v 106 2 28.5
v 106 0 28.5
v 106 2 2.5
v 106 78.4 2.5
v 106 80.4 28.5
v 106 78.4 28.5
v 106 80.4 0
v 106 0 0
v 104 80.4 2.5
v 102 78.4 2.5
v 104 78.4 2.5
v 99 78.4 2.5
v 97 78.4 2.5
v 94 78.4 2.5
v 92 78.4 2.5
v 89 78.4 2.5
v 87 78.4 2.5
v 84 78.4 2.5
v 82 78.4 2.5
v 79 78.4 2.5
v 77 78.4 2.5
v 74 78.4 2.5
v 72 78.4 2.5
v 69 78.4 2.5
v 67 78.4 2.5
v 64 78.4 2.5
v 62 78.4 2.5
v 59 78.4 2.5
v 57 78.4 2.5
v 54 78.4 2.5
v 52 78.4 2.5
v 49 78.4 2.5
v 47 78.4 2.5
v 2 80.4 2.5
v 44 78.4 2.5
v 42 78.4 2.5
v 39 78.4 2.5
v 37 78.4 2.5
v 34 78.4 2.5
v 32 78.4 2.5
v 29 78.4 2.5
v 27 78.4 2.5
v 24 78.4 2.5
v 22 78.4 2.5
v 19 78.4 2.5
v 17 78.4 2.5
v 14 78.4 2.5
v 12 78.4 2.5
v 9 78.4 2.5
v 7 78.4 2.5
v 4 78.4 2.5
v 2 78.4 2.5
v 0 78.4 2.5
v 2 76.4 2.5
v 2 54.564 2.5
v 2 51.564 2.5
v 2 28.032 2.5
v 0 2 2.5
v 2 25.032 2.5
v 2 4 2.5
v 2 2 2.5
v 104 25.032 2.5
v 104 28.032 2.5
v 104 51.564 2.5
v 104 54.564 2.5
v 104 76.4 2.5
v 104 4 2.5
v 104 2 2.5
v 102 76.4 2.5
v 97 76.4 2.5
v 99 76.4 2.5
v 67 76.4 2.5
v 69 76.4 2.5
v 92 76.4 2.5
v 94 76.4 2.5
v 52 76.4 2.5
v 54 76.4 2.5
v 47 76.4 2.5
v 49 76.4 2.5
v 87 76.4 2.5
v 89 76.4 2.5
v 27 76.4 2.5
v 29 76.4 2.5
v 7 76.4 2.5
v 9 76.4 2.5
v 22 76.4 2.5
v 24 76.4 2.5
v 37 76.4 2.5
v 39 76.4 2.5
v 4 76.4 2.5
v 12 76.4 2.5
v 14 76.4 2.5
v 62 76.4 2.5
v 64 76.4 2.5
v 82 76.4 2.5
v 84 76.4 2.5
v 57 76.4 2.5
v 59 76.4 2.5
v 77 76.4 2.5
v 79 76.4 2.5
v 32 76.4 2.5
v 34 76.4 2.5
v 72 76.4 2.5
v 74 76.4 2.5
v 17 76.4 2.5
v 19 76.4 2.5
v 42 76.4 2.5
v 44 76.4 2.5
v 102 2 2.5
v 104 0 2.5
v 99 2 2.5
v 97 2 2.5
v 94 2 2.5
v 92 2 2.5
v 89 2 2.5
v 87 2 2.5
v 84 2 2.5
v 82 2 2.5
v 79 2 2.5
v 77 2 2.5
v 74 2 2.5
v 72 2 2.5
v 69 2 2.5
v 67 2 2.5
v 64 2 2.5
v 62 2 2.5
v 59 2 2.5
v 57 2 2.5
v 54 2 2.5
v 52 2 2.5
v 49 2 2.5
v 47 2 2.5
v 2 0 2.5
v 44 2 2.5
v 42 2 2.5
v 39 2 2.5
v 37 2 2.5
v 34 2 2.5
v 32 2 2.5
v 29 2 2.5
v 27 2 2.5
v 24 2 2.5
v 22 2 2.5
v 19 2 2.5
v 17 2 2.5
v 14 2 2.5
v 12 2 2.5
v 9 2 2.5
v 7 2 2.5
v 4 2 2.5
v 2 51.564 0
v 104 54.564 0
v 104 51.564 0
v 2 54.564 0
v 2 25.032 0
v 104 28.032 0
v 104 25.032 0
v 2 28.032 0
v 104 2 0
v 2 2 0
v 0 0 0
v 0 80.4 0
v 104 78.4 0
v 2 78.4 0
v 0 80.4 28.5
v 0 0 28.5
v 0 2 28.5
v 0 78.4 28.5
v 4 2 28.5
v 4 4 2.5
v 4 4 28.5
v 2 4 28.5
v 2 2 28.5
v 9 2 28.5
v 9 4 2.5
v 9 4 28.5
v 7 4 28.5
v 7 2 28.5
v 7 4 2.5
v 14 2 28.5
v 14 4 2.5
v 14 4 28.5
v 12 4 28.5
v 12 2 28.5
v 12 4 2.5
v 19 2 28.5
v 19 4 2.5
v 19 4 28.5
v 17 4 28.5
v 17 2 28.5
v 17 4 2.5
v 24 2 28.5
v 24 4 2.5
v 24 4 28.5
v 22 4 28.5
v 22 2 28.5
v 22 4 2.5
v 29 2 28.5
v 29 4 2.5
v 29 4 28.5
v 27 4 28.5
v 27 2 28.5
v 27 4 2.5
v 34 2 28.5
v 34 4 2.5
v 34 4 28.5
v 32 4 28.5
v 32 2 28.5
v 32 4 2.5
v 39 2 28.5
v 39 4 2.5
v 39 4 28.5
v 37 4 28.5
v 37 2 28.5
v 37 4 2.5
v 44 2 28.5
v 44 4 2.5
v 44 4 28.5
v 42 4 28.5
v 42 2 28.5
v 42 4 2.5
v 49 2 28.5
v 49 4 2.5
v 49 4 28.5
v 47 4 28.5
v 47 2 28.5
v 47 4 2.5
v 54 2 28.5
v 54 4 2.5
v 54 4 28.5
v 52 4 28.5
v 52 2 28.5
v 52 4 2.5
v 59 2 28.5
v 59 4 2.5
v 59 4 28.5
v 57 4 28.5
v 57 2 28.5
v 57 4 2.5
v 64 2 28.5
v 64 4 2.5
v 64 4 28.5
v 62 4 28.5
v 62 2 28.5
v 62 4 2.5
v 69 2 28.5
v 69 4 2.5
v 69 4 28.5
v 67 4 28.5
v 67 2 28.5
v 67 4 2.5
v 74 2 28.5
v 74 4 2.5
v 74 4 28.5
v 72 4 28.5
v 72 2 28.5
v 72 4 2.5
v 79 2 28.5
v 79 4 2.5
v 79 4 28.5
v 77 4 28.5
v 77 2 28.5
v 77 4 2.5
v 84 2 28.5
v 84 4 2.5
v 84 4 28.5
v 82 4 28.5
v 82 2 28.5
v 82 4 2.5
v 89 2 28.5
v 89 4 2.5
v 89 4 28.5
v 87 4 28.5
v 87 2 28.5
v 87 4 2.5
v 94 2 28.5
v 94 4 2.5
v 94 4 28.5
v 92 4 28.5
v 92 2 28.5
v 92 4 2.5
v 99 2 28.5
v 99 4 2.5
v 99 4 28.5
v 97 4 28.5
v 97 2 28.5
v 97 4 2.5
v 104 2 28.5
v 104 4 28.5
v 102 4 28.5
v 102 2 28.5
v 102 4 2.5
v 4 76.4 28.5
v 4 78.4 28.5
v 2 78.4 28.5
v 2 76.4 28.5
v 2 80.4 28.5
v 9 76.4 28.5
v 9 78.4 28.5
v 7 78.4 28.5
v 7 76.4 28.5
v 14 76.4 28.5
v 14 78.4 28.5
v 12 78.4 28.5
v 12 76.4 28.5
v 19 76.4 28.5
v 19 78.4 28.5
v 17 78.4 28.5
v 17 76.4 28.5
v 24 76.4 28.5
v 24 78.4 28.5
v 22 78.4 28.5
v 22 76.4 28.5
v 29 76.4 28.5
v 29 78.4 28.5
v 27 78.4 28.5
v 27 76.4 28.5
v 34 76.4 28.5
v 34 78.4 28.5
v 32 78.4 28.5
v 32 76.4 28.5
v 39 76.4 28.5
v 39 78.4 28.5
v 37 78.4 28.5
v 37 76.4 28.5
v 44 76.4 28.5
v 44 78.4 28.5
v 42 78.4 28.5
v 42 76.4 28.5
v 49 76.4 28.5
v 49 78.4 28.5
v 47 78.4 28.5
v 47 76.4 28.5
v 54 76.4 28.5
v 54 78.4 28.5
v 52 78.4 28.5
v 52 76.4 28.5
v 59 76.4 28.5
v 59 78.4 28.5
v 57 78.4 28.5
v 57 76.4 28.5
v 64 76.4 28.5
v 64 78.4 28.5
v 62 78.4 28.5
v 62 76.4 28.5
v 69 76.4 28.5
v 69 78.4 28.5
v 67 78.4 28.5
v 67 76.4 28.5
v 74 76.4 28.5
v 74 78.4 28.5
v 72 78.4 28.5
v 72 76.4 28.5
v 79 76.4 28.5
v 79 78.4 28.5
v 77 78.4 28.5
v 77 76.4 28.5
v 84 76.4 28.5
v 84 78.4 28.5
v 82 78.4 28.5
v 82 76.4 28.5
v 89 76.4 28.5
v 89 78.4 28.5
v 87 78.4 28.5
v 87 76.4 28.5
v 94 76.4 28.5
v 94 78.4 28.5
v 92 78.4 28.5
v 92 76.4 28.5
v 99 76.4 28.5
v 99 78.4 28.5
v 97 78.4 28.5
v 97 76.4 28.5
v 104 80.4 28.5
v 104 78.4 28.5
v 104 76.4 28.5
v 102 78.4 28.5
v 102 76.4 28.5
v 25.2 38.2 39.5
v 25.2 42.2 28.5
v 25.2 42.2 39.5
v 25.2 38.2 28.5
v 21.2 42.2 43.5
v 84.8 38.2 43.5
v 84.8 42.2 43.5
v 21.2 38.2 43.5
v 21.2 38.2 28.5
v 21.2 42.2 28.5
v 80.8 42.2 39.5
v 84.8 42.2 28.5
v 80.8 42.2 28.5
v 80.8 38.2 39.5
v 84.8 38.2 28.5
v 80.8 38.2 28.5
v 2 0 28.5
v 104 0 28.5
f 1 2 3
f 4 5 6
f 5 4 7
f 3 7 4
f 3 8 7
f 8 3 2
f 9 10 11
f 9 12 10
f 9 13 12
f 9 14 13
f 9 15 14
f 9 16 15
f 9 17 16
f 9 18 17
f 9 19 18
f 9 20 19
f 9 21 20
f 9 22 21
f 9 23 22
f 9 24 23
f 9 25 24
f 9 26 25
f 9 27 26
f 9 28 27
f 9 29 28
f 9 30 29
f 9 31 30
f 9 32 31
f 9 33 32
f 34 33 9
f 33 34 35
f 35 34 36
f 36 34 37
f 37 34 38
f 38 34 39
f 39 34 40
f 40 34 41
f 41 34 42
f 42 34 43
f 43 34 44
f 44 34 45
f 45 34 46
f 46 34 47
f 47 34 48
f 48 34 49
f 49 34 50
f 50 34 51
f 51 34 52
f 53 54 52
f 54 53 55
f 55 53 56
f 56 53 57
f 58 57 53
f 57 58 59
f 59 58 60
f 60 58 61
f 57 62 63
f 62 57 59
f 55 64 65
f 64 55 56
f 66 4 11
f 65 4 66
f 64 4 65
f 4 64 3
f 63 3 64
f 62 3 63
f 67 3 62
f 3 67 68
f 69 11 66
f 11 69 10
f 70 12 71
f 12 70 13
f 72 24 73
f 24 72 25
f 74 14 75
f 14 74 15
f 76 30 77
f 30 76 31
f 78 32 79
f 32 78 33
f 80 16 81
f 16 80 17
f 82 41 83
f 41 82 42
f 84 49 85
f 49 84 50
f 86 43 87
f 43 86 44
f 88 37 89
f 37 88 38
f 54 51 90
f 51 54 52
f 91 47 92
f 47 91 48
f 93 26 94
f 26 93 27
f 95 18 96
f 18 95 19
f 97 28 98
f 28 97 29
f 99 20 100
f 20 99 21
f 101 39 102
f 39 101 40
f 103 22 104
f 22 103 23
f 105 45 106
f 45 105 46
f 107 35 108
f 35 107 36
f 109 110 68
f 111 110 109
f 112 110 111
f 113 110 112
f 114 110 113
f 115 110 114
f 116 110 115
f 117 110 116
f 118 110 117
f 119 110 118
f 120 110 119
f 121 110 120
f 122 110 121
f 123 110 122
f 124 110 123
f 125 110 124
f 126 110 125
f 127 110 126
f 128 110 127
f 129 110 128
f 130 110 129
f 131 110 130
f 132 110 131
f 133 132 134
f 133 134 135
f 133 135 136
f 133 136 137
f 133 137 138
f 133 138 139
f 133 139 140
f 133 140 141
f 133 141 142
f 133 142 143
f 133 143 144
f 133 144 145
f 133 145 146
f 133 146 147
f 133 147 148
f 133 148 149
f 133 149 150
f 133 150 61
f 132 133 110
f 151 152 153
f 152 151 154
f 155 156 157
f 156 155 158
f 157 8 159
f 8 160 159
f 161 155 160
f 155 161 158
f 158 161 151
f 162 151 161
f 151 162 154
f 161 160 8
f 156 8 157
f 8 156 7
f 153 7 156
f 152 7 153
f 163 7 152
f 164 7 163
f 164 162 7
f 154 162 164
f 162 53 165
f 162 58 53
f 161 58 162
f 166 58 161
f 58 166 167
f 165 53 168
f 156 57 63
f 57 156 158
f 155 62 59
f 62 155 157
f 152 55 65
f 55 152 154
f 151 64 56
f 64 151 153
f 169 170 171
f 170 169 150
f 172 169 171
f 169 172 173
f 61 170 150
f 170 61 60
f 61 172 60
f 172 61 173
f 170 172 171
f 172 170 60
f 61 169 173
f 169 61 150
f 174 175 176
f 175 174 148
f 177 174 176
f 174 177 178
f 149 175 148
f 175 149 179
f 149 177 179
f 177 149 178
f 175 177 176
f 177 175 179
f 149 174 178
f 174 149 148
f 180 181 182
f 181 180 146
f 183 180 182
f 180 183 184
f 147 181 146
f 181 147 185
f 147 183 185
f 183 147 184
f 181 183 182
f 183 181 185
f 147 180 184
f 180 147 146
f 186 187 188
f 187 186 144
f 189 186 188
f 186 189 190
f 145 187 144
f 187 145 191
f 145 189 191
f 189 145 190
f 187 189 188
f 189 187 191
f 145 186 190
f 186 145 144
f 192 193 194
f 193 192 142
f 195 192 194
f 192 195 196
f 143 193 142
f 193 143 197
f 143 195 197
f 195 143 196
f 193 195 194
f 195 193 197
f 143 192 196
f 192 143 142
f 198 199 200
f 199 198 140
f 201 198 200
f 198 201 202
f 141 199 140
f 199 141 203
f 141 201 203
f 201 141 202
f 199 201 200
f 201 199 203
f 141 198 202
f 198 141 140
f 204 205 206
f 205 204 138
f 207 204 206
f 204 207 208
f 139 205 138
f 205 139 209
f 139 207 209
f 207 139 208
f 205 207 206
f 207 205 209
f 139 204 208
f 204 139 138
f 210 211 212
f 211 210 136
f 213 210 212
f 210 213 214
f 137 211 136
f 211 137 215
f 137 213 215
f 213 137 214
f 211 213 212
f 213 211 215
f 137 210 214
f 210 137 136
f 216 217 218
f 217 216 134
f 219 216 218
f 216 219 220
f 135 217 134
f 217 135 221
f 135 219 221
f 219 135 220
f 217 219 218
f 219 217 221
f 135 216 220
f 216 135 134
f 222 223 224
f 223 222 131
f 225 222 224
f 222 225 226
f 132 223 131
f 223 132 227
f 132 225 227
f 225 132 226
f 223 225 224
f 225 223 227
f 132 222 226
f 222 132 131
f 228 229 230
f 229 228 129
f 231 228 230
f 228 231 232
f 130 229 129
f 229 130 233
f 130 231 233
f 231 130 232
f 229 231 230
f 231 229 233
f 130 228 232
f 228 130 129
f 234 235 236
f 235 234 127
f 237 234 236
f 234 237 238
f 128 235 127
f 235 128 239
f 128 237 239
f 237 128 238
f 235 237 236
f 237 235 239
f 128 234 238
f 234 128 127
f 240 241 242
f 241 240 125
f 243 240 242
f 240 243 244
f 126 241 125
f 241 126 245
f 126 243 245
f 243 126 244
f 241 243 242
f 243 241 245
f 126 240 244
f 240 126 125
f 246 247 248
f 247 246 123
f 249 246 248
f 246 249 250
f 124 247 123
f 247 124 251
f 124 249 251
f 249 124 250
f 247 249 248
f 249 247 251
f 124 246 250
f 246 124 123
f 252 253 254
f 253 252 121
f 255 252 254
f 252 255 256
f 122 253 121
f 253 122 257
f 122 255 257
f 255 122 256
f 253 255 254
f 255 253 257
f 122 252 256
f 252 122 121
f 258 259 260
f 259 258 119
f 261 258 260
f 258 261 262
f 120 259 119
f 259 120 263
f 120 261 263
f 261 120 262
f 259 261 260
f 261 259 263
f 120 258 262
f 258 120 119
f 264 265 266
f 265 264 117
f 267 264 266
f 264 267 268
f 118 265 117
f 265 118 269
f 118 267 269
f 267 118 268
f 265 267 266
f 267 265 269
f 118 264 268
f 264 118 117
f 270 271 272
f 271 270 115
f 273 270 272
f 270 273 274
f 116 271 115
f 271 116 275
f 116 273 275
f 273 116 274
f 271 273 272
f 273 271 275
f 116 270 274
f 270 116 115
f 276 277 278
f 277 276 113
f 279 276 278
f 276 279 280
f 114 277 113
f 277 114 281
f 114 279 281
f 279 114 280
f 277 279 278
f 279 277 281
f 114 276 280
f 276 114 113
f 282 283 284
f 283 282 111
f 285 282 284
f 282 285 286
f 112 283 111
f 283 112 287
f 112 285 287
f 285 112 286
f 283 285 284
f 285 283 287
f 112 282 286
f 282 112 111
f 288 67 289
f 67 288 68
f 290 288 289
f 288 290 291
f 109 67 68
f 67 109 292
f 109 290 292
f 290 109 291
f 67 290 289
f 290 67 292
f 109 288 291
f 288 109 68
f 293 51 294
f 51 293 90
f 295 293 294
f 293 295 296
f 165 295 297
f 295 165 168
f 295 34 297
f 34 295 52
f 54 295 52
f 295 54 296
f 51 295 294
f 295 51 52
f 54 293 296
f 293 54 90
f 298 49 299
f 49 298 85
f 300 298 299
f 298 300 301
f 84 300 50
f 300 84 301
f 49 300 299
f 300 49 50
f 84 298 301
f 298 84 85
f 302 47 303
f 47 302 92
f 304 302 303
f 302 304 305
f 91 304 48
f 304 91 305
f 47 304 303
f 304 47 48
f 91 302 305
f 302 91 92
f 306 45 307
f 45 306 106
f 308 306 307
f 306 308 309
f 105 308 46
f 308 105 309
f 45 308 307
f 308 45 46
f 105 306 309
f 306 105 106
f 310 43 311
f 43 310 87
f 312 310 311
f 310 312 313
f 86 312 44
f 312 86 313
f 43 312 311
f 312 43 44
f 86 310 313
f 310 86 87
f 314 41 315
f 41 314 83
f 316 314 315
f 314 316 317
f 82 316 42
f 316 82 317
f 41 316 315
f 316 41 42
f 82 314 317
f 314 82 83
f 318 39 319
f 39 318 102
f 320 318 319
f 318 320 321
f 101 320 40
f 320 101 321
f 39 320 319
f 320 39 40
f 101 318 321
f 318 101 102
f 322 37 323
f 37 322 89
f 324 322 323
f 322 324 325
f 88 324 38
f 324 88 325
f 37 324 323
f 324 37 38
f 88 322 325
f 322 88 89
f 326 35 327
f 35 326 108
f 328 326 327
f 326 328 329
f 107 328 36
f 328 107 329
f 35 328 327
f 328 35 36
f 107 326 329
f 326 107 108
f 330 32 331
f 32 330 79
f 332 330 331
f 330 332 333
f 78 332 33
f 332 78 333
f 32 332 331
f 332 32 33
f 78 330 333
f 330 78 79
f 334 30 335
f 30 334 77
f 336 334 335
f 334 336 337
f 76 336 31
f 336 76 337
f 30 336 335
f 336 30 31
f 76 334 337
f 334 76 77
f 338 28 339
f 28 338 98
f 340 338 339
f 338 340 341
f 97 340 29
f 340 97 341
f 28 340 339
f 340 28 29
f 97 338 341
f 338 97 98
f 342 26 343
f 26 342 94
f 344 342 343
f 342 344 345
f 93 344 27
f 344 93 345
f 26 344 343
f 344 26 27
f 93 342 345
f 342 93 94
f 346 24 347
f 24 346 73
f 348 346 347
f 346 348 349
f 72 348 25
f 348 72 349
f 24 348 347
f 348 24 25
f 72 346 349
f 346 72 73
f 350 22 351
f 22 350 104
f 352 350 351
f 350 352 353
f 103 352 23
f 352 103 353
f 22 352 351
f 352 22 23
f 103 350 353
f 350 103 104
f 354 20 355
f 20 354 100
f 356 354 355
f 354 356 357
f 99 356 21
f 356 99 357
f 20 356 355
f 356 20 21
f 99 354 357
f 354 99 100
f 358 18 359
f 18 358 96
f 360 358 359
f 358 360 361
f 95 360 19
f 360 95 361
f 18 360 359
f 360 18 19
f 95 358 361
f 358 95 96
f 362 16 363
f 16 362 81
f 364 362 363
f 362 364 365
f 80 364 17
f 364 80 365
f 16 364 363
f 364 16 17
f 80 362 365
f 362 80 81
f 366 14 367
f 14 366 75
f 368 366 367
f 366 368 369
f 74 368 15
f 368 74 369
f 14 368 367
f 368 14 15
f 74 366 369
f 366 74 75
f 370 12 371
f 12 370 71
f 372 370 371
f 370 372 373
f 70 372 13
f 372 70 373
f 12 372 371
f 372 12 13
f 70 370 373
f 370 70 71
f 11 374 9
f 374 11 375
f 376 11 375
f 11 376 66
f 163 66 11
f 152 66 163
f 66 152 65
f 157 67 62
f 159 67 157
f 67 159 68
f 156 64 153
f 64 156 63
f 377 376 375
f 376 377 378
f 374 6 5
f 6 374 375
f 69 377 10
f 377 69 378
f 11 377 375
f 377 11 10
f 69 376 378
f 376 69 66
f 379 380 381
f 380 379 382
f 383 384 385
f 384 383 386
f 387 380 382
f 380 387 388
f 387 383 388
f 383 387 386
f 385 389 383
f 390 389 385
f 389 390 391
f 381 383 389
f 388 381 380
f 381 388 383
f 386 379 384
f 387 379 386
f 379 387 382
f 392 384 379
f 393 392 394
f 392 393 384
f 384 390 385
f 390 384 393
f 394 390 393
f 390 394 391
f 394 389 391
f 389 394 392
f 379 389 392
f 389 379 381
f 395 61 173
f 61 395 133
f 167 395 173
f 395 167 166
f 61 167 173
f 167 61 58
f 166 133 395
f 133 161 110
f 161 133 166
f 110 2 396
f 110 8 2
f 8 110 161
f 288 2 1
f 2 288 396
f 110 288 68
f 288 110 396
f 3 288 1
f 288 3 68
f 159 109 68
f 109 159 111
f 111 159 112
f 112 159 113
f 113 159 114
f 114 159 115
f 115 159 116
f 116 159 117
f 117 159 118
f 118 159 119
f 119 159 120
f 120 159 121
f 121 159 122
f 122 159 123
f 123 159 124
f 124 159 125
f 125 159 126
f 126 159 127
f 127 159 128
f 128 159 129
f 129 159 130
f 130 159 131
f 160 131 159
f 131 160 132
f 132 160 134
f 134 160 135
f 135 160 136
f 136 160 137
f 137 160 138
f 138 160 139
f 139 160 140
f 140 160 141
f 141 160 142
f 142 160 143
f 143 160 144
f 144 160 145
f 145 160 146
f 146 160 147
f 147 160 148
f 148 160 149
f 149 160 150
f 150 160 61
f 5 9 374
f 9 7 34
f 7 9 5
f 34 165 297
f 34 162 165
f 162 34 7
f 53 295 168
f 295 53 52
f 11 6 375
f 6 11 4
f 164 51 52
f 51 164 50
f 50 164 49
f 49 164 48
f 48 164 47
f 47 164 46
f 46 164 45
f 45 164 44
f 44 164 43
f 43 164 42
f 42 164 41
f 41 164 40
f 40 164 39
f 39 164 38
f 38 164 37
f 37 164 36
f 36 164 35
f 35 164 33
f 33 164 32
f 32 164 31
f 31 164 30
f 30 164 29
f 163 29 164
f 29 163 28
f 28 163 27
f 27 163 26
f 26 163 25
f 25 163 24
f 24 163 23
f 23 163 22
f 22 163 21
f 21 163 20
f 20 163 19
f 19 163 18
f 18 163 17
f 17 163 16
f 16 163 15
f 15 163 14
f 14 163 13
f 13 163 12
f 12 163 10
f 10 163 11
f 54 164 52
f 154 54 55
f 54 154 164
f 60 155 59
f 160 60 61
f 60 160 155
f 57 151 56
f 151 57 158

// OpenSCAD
// ============================================================================
// staining_rack.scad — Class III: Kinematic Fluid / Staining Rack
// ============================================================================
// Reference: docs/RESEARCH.pdf §6 (Kinematic Fluid Systems)
//
// Skeletonized open frame designed for slide immersion in staining solutions
// (Coplin jars, staining dishes). Features knife-edge ribs for minimal contact,
// open crossbar bottom for fluid circulation, and drainage-angled surfaces.
//
// Parts:
//   render_mode 0 → rack
// ============================================================================

use <slide_lib.scad>

// ---------------------------------------------------------------------------
// Parameters (injected by platform via -D)
// ---------------------------------------------------------------------------

// --- Slide Standard ---
slide_standard = 0;       // 0=ISO, 1=US, 2=Petrographic, 3=Supa Mega, 4=Custom
custom_slide_length = 76;
custom_slide_width = 26;
custom_slide_thickness = 1.0;

// --- Architecture ---
num_slots = 20;            // Number of slide positions

// --- Tolerances ---
tolerance_xy = 0.4;        // XY clearance (mm)
tolerance_z = 0.2;         // Z / thickness clearance (mm)

// --- Structure ---
wall_thickness = 2.0;      // Outer wall / pillar thickness (mm)

// --- Rack-specific ---
handle = 1;                // 1=generate carrying handle
drainage_angle = 5;        // Drainage slope in degrees
open_bottom = 1;           // 1=crossbar floor, 0=solid floor

// --- Features ---
label_area = 1;            // 1=generate debossed label recess

// --- Quality ---
fn = 0;                    // Resolution ($fn), 0 = auto

// --- Mode ---
render_mode = 0;           // 0=rack

// ---------------------------------------------------------------------------
// Resolution
// ---------------------------------------------------------------------------
$fn = fn > 0 ? fn : 32;

// ---------------------------------------------------------------------------
// Resolve Slide Dimensions
// ---------------------------------------------------------------------------
_slide = resolve_slide(slide_standard, custom_slide_length,
                       custom_slide_width, custom_slide_thickness);
_sl = _slide[0];   // slide length
_sw = _slide[1];   // slide width
_st = _slide[2];   // slide thickness

// ---------------------------------------------------------------------------
// Derived Dimensions (RESEARCH §6.1)
// ---------------------------------------------------------------------------

// Staining racks force minimum pitch for fluid dynamics (RESEARCH §5.1.2)
_min_rib_w = 2.0;
_slot_w = slot_width(_st, tolerance_z);
_pitch = pitch(_slot_w, _min_rib_w);
_forced_pitch = max(_pitch, 5.0);   // Minimum 5mm pitch for staining

// Slot depth: slides fully immersed, depth = slide_width
_slot_depth = _sw;
_rib_height = _slot_depth;

// Frame dimensions
_pillar_w = wall_thickness;
_crossbar_w = 3.0;    // crossbar width
_crossbar_h = 2.5;    // crossbar height

// Body envelope
_body_x = (num_slots * _forced_pitch) + _min_rib_w + (2 * _pillar_w);
_body_y = _sl + (2 * _pillar_w) + tolerance_xy;
_base_h = open_bottom == 1 ? _crossbar_h : wall_thickness;
_body_z = _rib_height + _base_h;

// Handle dimensions (RESEARCH §6.2)
_handle_w = min(_body_x * 0.6, 80);
_handle_h = 15;
_handle_thick = 4;

// ---------------------------------------------------------------------------
// rack — Skeletonized staining frame
// ---------------------------------------------------------------------------
module rack() {
    // --- Four corner pillars ---
    // Front-left
    cube([_pillar_w, _pillar_w, _body_z]);
    // Front-right
    translate([_body_x - _pillar_w, 0, 0])
        cube([_pillar_w, _pillar_w, _body_z]);
    // Back-left
    translate([0, _body_y - _pillar_w, 0])
        cube([_pillar_w, _pillar_w, _body_z]);
    // Back-right
    translate([_body_x - _pillar_w, _body_y - _pillar_w, 0])
        cube([_pillar_w, _pillar_w, _body_z]);

    // --- Top rails (connect pillars, hold ribs) ---
    // Front rail
    cube([_body_x, _pillar_w, _crossbar_h]);
    // Back rail
    translate([0, _body_y - _pillar_w, 0])
        cube([_body_x, _pillar_w, _crossbar_h]);
    // Left rail
    cube([_pillar_w, _body_y, _crossbar_h]);
    // Right rail
    translate([_body_x - _pillar_w, 0, 0])
        cube([_pillar_w, _body_y, _crossbar_h]);

    // --- Bottom crossbars (open or solid) ---
    if (open_bottom == 1) {
        // Two crossbars at 33% and 66% for slide support
        for (frac = [0.33, 0.66]) {
            translate([0, _body_y * frac - _crossbar_w / 2, 0])
                cube([_body_x, _crossbar_w, _crossbar_h]);
        }
    } else {
        // Solid floor with drainage slope
        if (drainage_angle > 0) {
            drainage_slope(_body_y, _body_x, wall_thickness, drainage_angle);
        } else {
            cube([_body_x, _body_y, wall_thickness]);
        }
    }

    // --- Slotted rib rails (knife-edge profile) ---
    // Front rib rail
    translate([_pillar_w, _pillar_w, _crossbar_h]) {
        _inner_x = _body_x - 2 * _pillar_w;
        // Use thin rectangular ribs for knife-edge contact
        for (i = [0 : num_slots]) {
            translate([i * _forced_pitch, 0, 0])
                rectangular_rib(_rib_height, _pillar_w, _min_rib_w);
        }
    }

    // Back rib rail (mirrors front)
    translate([_pillar_w, _body_y - 2 * _pillar_w, _crossbar_h]) {
        for (i = [0 : num_slots]) {
            translate([i * _forced_pitch, 0, 0])
                rectangular_rib(_rib_height, _pillar_w, _min_rib_w);
        }
    }

    // --- Handle (RESEARCH §6.2) ---
    if (handle == 1) {
        _hx = (_body_x - _handle_w) / 2;
        _hy = (_body_y - _handle_thick) / 2;
        _hz = _body_z;

        // Two uprights
        translate([_hx, _hy, _hz])
            cube([_handle_thick, _handle_thick, _handle_h]);
        translate([_hx + _handle_w - _handle_thick, _hy, _hz])
            cube([_handle_thick, _handle_thick, _handle_h]);

        // Crossbar
        translate([_hx, _hy, _hz + _handle_h - _handle_thick])
            cube([_handle_w, _handle_thick, _handle_thick]);
    }

    // --- Label recess on front pillar ---
    if (label_area == 1 && fn > 0) {
        _label_w = min(30, _body_x * 0.3);
        _label_h = min(8, _crossbar_h * 0.8);
        translate([(_body_x - _label_w) / 2, -0.01, (_crossbar_h - _label_h) / 2])
            rotate([90, 0, 0])
                translate([0, 0, -0.4])
                    label_recess(_label_w, _label_h, 0.5);
    }
}

// ---------------------------------------------------------------------------
// Render Mode Dispatch
// ---------------------------------------------------------------------------
if (render_mode == 0) {
    rack();
}
